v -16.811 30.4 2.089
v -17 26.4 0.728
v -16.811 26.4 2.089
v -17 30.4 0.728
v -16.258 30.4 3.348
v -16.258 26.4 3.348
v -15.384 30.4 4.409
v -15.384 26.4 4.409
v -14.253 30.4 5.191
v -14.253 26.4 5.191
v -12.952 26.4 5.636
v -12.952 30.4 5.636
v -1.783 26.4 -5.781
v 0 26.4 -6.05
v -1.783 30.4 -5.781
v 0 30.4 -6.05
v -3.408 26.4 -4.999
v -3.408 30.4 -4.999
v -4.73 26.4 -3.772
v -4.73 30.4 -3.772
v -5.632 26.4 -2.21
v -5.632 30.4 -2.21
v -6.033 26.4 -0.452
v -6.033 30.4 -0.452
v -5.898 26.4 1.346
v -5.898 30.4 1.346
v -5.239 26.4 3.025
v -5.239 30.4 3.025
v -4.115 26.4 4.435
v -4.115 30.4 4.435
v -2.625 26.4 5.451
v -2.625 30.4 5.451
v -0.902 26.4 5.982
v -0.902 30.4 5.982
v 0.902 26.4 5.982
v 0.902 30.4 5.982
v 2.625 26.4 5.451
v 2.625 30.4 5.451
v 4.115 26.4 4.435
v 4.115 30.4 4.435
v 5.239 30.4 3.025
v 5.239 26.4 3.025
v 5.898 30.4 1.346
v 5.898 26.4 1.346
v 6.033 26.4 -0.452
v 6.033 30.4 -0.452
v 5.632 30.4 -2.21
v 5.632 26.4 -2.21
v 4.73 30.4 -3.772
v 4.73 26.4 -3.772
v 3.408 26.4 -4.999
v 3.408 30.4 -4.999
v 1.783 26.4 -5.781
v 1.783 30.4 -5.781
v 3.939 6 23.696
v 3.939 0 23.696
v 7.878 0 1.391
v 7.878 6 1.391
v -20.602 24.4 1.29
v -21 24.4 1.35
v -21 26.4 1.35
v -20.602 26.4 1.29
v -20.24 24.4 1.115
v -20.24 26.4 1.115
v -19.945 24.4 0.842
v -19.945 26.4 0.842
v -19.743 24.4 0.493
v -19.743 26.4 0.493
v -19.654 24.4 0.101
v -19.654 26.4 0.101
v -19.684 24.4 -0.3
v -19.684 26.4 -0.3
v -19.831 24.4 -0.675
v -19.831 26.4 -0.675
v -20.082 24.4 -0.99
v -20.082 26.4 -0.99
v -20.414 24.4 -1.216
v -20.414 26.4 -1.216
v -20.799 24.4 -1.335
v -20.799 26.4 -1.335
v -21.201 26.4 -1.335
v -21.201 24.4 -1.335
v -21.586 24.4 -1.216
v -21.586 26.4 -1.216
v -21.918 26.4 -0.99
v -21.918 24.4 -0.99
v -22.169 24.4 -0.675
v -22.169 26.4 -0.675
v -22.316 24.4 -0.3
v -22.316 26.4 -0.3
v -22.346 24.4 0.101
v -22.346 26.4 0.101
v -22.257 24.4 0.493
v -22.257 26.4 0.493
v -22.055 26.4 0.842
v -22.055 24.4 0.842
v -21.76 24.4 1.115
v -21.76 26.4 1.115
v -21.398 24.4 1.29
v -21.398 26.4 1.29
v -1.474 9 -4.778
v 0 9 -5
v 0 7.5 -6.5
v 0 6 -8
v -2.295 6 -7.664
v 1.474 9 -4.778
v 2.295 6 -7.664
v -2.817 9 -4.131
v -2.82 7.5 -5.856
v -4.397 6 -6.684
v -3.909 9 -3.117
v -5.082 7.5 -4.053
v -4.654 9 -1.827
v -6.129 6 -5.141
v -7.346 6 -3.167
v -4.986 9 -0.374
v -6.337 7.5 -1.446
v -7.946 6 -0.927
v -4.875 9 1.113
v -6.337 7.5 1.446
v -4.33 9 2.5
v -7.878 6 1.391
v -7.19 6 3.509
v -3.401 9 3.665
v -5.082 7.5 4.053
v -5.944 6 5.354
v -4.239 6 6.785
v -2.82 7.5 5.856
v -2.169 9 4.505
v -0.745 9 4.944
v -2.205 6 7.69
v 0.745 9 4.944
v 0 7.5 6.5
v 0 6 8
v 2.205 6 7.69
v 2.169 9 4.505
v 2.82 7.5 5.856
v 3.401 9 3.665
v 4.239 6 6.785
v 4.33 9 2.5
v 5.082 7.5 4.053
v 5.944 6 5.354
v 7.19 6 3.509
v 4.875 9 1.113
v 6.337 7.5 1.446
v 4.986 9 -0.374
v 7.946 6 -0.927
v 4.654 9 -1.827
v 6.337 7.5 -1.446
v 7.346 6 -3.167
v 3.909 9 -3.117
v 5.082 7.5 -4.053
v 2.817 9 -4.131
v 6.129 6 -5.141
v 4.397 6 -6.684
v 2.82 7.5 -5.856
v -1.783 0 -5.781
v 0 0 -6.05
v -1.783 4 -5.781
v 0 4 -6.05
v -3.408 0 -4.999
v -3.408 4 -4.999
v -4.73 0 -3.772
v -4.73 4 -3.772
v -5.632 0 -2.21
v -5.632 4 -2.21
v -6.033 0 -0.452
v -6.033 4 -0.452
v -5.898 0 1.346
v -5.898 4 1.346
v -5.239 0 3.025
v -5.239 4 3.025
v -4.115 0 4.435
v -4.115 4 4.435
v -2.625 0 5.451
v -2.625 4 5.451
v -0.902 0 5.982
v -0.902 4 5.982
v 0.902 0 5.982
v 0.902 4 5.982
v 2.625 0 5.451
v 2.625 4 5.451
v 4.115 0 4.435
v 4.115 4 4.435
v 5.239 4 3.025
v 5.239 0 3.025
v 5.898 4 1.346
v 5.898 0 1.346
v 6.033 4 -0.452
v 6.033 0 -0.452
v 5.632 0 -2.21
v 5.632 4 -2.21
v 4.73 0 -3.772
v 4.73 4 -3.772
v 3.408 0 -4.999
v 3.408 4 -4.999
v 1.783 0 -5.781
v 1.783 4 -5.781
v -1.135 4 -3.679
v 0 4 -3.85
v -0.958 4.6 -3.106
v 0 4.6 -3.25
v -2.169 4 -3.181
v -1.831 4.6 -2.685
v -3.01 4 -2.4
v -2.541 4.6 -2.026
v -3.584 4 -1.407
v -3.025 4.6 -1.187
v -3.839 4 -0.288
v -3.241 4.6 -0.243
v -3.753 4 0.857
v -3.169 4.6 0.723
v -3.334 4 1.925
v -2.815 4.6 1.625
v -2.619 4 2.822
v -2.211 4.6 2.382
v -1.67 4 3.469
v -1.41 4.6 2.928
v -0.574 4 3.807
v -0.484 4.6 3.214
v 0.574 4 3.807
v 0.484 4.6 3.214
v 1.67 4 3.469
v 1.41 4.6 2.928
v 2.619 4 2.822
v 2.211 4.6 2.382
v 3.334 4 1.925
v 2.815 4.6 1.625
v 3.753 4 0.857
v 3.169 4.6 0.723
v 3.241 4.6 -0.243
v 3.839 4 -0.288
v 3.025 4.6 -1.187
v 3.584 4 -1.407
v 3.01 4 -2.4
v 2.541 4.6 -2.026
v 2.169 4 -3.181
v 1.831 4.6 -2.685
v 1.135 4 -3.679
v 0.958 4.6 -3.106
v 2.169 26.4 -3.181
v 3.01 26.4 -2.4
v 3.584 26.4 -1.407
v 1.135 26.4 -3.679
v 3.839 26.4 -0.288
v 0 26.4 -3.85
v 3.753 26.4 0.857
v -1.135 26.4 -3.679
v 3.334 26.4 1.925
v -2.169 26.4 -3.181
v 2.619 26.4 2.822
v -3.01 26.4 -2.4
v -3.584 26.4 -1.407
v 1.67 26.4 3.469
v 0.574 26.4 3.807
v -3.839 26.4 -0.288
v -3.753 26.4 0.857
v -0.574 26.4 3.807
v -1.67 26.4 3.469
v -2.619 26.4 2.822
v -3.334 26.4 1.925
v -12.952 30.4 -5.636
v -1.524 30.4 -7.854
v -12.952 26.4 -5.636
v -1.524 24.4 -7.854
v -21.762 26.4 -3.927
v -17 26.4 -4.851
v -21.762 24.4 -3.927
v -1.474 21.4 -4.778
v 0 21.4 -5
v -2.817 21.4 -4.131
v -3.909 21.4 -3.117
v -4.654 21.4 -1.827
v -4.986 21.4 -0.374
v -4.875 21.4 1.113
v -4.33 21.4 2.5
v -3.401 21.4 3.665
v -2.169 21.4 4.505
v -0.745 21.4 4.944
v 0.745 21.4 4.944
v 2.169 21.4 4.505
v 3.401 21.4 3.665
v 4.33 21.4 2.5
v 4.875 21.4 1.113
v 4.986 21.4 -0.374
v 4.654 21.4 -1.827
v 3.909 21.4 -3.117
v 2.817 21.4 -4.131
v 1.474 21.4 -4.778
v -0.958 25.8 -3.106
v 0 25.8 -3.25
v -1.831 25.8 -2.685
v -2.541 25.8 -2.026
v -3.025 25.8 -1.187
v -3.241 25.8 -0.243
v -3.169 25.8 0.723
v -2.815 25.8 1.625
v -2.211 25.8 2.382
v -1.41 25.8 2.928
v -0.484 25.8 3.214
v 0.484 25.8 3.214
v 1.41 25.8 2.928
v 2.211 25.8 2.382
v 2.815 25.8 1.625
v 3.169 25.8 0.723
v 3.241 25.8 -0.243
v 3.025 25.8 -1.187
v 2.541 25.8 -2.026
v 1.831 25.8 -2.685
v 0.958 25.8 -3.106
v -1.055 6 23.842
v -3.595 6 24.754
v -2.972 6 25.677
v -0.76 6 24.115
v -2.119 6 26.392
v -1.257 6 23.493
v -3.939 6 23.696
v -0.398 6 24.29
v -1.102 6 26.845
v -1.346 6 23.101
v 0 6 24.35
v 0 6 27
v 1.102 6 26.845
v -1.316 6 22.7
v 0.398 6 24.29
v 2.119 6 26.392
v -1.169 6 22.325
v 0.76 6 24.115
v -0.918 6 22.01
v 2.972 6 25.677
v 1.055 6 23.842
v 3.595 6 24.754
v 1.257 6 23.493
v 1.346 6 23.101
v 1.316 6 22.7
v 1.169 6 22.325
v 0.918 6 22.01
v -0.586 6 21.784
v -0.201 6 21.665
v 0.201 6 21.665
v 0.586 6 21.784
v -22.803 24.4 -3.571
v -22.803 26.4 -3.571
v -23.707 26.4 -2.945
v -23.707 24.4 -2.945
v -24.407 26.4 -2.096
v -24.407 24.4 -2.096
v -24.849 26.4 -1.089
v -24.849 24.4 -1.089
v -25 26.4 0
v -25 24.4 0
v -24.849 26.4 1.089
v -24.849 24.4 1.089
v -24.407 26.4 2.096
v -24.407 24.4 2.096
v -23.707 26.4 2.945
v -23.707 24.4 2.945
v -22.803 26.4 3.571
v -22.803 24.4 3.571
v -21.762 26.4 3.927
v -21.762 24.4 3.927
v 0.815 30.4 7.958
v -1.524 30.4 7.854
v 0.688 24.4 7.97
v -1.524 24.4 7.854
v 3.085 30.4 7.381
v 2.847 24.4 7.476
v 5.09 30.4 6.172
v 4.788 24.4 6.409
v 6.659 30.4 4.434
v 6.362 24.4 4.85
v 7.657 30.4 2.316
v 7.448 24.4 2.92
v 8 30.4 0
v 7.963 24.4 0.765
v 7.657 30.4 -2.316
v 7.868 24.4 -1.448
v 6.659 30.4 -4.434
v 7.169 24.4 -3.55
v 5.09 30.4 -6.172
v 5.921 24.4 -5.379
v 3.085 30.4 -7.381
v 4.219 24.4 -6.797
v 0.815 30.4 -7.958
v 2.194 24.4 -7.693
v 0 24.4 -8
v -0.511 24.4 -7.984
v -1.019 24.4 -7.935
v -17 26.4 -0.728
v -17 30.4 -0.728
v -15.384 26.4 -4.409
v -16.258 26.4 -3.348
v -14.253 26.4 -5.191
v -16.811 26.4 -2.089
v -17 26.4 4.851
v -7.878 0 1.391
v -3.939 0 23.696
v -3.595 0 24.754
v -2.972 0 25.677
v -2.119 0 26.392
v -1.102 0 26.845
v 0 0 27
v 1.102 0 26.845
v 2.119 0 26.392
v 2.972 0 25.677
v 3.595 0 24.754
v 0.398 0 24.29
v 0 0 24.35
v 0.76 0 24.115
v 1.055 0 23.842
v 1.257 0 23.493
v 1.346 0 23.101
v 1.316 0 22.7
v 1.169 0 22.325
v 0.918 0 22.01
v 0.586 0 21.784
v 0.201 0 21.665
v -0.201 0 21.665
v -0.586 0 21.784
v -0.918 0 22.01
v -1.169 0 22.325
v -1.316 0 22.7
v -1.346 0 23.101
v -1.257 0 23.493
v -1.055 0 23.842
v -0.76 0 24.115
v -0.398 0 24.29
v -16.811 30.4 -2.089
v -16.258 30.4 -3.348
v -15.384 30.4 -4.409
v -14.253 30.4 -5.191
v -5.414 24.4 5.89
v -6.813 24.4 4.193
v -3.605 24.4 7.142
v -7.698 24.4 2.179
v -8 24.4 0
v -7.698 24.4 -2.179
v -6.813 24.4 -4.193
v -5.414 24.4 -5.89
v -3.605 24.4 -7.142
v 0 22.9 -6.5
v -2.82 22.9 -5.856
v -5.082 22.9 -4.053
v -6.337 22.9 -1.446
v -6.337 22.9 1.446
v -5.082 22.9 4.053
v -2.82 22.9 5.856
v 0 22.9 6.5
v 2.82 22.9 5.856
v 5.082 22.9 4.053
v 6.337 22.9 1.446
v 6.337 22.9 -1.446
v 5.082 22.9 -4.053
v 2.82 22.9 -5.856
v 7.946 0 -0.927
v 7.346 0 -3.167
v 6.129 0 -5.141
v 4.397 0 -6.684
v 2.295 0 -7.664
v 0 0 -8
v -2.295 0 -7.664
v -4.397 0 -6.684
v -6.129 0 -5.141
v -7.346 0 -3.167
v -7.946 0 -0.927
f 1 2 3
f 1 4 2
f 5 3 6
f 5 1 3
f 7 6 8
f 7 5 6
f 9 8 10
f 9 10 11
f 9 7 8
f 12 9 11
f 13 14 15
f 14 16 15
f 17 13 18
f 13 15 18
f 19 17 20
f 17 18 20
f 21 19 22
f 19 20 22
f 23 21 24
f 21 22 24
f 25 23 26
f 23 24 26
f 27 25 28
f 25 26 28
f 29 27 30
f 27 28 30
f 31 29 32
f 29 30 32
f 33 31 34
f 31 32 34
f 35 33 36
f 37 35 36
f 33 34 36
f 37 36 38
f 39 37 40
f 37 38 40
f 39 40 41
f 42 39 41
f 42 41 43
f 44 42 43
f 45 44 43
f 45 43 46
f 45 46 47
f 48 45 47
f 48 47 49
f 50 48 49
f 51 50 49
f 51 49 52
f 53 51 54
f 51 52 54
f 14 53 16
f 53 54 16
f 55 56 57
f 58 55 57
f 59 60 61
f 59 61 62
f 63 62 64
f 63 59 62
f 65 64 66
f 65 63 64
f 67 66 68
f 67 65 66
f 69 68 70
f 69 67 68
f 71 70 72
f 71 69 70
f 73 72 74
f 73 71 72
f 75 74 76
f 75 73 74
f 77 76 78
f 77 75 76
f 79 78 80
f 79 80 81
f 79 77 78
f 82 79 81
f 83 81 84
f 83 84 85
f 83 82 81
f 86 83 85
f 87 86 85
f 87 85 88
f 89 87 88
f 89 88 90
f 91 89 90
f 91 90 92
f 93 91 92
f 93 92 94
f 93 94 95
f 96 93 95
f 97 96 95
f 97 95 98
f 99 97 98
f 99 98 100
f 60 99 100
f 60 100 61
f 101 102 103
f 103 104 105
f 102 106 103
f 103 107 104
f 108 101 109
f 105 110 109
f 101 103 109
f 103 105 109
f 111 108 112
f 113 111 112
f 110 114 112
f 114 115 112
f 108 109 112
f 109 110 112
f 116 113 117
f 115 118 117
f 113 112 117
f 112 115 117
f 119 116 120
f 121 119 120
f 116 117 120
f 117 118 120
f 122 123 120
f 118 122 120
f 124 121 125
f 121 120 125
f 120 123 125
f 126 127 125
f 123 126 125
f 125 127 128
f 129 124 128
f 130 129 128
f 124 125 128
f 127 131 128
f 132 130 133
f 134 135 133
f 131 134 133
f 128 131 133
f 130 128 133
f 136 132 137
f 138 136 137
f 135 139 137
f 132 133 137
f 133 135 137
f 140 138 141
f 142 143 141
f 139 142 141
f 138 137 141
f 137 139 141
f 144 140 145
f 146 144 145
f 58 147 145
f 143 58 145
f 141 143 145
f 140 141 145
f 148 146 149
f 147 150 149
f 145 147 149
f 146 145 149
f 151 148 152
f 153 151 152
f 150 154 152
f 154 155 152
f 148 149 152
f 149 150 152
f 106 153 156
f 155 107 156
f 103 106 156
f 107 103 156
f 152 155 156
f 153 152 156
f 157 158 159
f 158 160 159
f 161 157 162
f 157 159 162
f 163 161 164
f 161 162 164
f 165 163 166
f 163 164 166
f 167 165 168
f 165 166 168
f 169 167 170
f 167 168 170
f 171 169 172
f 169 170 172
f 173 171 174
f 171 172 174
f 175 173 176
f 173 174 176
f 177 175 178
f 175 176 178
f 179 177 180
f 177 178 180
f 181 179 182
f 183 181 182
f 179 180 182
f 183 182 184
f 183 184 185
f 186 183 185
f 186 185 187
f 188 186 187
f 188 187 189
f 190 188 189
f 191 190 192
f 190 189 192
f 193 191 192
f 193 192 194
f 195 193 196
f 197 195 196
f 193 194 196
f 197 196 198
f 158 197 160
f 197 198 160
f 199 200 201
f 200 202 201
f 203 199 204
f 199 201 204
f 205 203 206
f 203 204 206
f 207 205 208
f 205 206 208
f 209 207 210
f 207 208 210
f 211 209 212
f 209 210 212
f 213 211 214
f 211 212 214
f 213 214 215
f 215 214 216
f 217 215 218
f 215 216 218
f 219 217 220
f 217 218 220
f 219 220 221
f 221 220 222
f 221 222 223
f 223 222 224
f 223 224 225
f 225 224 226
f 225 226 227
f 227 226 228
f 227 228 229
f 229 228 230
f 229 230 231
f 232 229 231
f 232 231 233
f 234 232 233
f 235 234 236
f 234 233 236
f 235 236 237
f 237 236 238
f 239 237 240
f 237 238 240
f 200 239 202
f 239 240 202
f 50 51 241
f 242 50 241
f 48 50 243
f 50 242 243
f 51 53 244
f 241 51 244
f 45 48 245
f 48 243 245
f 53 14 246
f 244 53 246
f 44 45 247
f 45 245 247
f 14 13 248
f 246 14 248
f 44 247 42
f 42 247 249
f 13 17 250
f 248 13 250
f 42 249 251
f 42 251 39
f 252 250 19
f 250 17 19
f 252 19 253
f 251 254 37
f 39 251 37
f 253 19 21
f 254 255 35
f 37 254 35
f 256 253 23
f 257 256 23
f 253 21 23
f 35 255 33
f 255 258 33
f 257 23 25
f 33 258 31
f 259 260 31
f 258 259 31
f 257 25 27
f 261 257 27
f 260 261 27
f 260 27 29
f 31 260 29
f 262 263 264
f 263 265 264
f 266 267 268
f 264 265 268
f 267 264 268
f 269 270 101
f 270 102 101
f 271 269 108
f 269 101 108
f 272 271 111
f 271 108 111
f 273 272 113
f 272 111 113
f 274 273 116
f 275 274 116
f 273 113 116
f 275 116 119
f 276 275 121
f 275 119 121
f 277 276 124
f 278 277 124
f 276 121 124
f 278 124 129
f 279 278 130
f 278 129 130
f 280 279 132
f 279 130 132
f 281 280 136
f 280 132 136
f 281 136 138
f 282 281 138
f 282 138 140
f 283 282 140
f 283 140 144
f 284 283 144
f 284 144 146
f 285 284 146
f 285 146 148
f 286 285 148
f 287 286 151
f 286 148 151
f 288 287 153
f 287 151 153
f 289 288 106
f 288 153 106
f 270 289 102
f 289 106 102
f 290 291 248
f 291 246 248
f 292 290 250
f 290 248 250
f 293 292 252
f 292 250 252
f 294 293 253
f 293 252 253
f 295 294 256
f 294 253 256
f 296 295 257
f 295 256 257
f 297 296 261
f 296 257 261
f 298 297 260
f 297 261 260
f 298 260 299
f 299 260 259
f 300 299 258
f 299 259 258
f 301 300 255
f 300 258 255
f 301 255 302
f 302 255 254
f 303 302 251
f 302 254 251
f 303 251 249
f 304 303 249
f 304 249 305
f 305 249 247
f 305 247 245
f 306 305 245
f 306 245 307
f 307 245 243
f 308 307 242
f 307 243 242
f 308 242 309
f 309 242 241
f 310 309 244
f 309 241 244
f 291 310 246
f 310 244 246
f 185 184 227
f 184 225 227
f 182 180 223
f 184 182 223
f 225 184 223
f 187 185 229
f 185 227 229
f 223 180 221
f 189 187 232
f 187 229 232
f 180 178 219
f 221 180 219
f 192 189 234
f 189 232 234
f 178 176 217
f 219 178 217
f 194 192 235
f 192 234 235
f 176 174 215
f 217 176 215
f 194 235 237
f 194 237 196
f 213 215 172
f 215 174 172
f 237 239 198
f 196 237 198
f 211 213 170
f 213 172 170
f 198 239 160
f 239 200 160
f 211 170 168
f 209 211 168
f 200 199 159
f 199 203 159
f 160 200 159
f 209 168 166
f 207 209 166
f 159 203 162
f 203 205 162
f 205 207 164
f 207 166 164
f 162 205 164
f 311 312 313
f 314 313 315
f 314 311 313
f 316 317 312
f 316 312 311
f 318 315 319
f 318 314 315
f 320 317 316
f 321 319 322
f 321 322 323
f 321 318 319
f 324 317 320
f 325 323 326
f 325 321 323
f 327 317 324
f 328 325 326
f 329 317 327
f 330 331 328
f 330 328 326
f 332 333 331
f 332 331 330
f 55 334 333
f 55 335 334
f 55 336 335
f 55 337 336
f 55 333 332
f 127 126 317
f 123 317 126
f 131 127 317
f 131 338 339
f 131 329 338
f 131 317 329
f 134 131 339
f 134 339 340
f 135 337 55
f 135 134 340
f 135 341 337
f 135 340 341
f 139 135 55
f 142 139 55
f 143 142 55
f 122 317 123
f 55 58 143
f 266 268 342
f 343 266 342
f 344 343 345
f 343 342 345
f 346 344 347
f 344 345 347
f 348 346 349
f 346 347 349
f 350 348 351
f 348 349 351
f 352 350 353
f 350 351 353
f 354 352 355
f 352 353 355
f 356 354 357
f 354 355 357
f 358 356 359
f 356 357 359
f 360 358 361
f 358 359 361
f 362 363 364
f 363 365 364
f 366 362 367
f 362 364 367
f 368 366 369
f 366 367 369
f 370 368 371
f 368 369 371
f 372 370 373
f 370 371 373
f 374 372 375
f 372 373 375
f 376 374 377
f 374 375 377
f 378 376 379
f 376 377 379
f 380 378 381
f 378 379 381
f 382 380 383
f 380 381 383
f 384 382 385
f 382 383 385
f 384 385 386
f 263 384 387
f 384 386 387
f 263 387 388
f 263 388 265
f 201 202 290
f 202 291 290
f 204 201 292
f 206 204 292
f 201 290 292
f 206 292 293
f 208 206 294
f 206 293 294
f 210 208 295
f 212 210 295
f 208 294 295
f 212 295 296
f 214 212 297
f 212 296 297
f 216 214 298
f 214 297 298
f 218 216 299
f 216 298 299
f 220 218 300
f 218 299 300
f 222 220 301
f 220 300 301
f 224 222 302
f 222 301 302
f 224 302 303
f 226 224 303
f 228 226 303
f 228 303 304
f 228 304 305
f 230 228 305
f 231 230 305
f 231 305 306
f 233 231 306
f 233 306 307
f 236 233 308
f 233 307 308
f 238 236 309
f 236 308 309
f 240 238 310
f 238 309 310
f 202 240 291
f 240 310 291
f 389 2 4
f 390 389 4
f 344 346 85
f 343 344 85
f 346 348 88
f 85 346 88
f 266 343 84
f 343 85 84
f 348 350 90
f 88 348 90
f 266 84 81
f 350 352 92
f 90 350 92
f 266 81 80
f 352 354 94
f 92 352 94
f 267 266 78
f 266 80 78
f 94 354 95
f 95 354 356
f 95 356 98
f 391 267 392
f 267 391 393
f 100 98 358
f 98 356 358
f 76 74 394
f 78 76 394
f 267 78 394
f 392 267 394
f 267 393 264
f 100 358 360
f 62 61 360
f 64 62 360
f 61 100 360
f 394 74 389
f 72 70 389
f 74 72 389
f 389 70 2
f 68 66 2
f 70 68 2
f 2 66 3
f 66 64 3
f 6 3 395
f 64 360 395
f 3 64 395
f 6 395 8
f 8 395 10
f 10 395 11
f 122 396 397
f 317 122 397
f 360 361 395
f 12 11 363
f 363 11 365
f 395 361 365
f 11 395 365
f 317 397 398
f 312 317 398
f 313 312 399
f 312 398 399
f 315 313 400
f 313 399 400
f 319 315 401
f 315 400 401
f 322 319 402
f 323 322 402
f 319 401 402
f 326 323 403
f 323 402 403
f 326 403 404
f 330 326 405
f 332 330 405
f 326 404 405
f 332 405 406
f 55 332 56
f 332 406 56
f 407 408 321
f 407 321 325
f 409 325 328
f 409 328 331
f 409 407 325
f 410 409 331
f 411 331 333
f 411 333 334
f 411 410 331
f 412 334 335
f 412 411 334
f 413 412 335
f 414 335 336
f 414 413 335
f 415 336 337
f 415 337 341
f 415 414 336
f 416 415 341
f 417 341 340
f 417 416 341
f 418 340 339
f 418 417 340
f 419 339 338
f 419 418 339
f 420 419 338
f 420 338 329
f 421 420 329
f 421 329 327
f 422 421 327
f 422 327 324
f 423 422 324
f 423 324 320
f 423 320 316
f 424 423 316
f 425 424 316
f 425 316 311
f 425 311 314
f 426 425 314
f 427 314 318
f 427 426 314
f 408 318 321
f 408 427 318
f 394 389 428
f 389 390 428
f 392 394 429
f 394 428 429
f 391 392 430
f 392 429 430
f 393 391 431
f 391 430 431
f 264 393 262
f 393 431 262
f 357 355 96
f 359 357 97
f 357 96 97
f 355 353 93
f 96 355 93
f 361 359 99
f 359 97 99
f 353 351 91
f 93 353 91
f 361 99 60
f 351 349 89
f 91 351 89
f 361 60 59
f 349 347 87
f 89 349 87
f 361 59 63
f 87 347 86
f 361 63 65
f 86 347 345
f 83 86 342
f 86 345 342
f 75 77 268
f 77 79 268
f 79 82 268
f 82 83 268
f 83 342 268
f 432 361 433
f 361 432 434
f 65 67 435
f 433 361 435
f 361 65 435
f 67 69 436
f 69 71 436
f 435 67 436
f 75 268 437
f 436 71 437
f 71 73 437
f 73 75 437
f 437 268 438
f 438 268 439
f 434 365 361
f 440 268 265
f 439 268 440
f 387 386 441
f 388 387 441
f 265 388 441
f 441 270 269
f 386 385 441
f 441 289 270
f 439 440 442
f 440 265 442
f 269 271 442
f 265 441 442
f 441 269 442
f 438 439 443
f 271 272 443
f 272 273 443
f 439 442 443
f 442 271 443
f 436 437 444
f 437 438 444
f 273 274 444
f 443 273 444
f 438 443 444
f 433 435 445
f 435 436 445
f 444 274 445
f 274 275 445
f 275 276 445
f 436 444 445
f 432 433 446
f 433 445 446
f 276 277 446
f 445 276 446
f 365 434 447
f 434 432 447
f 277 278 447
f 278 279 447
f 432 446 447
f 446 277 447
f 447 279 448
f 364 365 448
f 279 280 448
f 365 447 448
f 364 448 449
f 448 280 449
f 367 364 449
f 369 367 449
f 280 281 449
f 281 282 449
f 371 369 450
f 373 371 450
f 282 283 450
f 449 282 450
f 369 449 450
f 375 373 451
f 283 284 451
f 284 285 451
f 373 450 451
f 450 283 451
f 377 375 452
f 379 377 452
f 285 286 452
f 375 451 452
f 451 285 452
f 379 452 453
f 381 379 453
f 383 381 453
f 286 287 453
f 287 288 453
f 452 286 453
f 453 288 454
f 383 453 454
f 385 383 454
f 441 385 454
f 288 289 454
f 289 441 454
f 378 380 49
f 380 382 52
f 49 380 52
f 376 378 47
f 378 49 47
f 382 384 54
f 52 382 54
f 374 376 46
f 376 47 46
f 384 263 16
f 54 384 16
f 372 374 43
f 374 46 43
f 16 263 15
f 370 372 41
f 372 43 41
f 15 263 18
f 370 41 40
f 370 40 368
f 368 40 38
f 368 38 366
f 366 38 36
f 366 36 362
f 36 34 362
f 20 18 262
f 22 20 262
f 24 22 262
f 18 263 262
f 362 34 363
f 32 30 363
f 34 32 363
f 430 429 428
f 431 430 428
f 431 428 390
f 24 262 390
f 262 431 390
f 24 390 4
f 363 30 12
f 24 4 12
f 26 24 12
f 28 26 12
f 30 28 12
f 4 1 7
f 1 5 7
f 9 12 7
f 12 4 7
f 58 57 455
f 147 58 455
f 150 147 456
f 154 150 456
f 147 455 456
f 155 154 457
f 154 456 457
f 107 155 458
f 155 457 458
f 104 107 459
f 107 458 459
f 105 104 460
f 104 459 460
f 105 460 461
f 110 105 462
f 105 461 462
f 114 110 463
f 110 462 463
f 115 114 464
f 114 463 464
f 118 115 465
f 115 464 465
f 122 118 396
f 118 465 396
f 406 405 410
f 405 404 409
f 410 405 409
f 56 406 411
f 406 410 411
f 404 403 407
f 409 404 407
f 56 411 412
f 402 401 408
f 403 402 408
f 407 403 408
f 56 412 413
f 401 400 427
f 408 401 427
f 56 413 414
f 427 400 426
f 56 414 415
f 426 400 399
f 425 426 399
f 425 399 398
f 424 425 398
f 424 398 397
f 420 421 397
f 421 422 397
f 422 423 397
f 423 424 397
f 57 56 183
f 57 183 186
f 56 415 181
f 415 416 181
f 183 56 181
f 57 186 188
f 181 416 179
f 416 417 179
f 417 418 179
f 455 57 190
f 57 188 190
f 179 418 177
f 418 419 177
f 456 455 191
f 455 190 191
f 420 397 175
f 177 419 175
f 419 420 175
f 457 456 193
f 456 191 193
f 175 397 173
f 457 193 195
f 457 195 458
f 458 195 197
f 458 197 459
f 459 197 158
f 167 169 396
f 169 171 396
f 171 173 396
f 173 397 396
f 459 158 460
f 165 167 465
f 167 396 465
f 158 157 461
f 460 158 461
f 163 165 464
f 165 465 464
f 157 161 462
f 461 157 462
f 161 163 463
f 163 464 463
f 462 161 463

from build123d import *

# Parameters (mm, degrees)
ESQUISSE2_R                         = 1.35
BOSS_EXTRU_2_DEPTH                  = 6
BOSS_EXTRU_3_START                  = -6
ESQUISSE3_R                         = 1.35
BOSS_EXTRU_3_DEPTH                  = 6
ENL_V_MAT_EXTRU_1_REACH             = 49.73
ESQUISSE4_W                         = 8
ESQUISSE4_H                         = 4
ENL_V_MAT_EXTRU_1_DIRECTION_2_REACH = 49.73
CONG_1_R                            = 5


with BuildPart() as part:
    # Esquisse1 → Révolution1 (revolve)
    with BuildSketch(Plane.XY, mode=Mode.PRIVATE) as r_volution1_sk:
        Polygon((-6.05, 0), (-6.05, 4), (-3.85, 4), (-3.25, 4.6), (-3.25, 25.8), (-3.85, 26.4), (-6.05, 26.4), (-6.05, 30.4), (-8, 30.4), (-8, 24.4), (-5, 21.4), (-5, 9), (-8, 6), (-8, 0), align=None)
    revolve(r_volution1_sk.sketch.rotate(Axis((0, -1.144220684, 0), (0, 1, 0)), 270), axis=Axis((0, -1.144220684, 0), (0, 1, 0)))

    # Esquisse2 → Boss.-Extru.2 (add)
    with BuildSketch(Plane(origin=(0, 0, 0), x_dir=(1, 0, 0), z_dir=(0, 1, 0))):
        with BuildLine():
            Line((-7.878088106, -1.391304348), (-3.939044053, -23.695652174))
            ThreePointArc((-3.939044053, -23.695652174), (0, -27), (3.939044053, -23.695652174))
            Line((3.939044053, -23.695652174), (7.878088106, -1.391304348))
            ThreePointArc((7.878088106, -1.391304348), (0, -8), (-7.878088106, -1.391304348))
        make_face()
        with Locations(Location((0, -23, 0), (0, 0, 270))):
            Circle(ESQUISSE2_R, mode=Mode.SUBTRACT)
    extrude(amount=BOSS_EXTRU_2_DEPTH)

    # Esquisse3 → Boss.-Extru.3 (add)
    with BuildSketch(Plane(origin=(0, 30.4, 0), x_dir=(1, 0, 0), z_dir=(0, 1, 0)).offset(BOSS_EXTRU_3_START)):
        with BuildLine():
            Line((-21.761904762, -3.926767262), (-1.523809524, -7.853534525))
            ThreePointArc((-1.523809524, -7.853534525), (-8, 0), (-1.523809524, 7.853534525))
            Line((-1.523809524, 7.853534525), (-21.761904762, 3.926767262))
            ThreePointArc((-21.761904762, 3.926767262), (-25, 0), (-21.761904762, -3.926767262))
        make_face()
        with Locations(Location((-21, 0, 0), (0, 0, 270))):
            Circle(ESQUISSE3_R, mode=Mode.SUBTRACT)
    extrude(amount=BOSS_EXTRU_3_DEPTH)

    # Enlèv. mat.-Extru.1: up to this plane
    enl_v_mat_extru_1_end = Plane(origin=(-21.761904762, 24.4, -3.926767262), z_dir=(-0.19047619047618092, 0, -0.9816918156232545))
    # Esquisse4 → Enlèv. mat.-Extru.1 (cut, up to the surface)
    with BuildSketch(Plane.XY, mode=Mode.PRIVATE) as enl_v_mat_extru_1_sk1:
        with Locations((-21, 28.4)):
            Rectangle(ESQUISSE4_W, ESQUISSE4_H)
    enl_v_mat_extru_1_tool1 = split(extrude(enl_v_mat_extru_1_sk1.sketch, amount=-ENL_V_MAT_EXTRU_1_REACH, mode=Mode.PRIVATE), bisect_by=enl_v_mat_extru_1_end, keep=Keep.BOTH, mode=Mode.PRIVATE)
    add(enl_v_mat_extru_1_tool1.solids().sort_by_distance((-21, 28.4, 0))[0], mode=Mode.SUBTRACT)

    # Enlèv. mat.-Extru.1 direction 2: up to this plane
    enl_v_mat_extru_1_direction_2_end = Plane(origin=(-21.761904762, 24.4, 3.926767262), z_dir=(-0.19047619047620132, 0, 0.9816918156232504))
    # Esquisse4 → Enlèv. mat.-Extru.1 direction 2 (cut, up to the surface)
    with BuildSketch(Plane.XY, mode=Mode.PRIVATE) as enl_v_mat_extru_1_direction_2_sk1:
        with Locations((-21, 28.4)):
            Rectangle(ESQUISSE4_W, ESQUISSE4_H)
    enl_v_mat_extru_1_direction_2_tool1 = split(extrude(enl_v_mat_extru_1_direction_2_sk1.sketch, amount=ENL_V_MAT_EXTRU_1_DIRECTION_2_REACH, mode=Mode.PRIVATE), bisect_by=enl_v_mat_extru_1_direction_2_end, keep=Keep.BOTH, mode=Mode.PRIVATE)
    add(enl_v_mat_extru_1_direction_2_tool1.solids().sort_by_distance((-21, 28.4, 0))[0], mode=Mode.SUBTRACT)

    # Congé1
    cong_1_edges = [part.edges().sort_by_distance(p)[0] for p in [
        (-17, 28.4, -4.850712501),
        (-17, 28.4, 4.850712501),
    ]]
    fillet(cong_1_edges, radius=CONG_1_R)


solid = part.part
